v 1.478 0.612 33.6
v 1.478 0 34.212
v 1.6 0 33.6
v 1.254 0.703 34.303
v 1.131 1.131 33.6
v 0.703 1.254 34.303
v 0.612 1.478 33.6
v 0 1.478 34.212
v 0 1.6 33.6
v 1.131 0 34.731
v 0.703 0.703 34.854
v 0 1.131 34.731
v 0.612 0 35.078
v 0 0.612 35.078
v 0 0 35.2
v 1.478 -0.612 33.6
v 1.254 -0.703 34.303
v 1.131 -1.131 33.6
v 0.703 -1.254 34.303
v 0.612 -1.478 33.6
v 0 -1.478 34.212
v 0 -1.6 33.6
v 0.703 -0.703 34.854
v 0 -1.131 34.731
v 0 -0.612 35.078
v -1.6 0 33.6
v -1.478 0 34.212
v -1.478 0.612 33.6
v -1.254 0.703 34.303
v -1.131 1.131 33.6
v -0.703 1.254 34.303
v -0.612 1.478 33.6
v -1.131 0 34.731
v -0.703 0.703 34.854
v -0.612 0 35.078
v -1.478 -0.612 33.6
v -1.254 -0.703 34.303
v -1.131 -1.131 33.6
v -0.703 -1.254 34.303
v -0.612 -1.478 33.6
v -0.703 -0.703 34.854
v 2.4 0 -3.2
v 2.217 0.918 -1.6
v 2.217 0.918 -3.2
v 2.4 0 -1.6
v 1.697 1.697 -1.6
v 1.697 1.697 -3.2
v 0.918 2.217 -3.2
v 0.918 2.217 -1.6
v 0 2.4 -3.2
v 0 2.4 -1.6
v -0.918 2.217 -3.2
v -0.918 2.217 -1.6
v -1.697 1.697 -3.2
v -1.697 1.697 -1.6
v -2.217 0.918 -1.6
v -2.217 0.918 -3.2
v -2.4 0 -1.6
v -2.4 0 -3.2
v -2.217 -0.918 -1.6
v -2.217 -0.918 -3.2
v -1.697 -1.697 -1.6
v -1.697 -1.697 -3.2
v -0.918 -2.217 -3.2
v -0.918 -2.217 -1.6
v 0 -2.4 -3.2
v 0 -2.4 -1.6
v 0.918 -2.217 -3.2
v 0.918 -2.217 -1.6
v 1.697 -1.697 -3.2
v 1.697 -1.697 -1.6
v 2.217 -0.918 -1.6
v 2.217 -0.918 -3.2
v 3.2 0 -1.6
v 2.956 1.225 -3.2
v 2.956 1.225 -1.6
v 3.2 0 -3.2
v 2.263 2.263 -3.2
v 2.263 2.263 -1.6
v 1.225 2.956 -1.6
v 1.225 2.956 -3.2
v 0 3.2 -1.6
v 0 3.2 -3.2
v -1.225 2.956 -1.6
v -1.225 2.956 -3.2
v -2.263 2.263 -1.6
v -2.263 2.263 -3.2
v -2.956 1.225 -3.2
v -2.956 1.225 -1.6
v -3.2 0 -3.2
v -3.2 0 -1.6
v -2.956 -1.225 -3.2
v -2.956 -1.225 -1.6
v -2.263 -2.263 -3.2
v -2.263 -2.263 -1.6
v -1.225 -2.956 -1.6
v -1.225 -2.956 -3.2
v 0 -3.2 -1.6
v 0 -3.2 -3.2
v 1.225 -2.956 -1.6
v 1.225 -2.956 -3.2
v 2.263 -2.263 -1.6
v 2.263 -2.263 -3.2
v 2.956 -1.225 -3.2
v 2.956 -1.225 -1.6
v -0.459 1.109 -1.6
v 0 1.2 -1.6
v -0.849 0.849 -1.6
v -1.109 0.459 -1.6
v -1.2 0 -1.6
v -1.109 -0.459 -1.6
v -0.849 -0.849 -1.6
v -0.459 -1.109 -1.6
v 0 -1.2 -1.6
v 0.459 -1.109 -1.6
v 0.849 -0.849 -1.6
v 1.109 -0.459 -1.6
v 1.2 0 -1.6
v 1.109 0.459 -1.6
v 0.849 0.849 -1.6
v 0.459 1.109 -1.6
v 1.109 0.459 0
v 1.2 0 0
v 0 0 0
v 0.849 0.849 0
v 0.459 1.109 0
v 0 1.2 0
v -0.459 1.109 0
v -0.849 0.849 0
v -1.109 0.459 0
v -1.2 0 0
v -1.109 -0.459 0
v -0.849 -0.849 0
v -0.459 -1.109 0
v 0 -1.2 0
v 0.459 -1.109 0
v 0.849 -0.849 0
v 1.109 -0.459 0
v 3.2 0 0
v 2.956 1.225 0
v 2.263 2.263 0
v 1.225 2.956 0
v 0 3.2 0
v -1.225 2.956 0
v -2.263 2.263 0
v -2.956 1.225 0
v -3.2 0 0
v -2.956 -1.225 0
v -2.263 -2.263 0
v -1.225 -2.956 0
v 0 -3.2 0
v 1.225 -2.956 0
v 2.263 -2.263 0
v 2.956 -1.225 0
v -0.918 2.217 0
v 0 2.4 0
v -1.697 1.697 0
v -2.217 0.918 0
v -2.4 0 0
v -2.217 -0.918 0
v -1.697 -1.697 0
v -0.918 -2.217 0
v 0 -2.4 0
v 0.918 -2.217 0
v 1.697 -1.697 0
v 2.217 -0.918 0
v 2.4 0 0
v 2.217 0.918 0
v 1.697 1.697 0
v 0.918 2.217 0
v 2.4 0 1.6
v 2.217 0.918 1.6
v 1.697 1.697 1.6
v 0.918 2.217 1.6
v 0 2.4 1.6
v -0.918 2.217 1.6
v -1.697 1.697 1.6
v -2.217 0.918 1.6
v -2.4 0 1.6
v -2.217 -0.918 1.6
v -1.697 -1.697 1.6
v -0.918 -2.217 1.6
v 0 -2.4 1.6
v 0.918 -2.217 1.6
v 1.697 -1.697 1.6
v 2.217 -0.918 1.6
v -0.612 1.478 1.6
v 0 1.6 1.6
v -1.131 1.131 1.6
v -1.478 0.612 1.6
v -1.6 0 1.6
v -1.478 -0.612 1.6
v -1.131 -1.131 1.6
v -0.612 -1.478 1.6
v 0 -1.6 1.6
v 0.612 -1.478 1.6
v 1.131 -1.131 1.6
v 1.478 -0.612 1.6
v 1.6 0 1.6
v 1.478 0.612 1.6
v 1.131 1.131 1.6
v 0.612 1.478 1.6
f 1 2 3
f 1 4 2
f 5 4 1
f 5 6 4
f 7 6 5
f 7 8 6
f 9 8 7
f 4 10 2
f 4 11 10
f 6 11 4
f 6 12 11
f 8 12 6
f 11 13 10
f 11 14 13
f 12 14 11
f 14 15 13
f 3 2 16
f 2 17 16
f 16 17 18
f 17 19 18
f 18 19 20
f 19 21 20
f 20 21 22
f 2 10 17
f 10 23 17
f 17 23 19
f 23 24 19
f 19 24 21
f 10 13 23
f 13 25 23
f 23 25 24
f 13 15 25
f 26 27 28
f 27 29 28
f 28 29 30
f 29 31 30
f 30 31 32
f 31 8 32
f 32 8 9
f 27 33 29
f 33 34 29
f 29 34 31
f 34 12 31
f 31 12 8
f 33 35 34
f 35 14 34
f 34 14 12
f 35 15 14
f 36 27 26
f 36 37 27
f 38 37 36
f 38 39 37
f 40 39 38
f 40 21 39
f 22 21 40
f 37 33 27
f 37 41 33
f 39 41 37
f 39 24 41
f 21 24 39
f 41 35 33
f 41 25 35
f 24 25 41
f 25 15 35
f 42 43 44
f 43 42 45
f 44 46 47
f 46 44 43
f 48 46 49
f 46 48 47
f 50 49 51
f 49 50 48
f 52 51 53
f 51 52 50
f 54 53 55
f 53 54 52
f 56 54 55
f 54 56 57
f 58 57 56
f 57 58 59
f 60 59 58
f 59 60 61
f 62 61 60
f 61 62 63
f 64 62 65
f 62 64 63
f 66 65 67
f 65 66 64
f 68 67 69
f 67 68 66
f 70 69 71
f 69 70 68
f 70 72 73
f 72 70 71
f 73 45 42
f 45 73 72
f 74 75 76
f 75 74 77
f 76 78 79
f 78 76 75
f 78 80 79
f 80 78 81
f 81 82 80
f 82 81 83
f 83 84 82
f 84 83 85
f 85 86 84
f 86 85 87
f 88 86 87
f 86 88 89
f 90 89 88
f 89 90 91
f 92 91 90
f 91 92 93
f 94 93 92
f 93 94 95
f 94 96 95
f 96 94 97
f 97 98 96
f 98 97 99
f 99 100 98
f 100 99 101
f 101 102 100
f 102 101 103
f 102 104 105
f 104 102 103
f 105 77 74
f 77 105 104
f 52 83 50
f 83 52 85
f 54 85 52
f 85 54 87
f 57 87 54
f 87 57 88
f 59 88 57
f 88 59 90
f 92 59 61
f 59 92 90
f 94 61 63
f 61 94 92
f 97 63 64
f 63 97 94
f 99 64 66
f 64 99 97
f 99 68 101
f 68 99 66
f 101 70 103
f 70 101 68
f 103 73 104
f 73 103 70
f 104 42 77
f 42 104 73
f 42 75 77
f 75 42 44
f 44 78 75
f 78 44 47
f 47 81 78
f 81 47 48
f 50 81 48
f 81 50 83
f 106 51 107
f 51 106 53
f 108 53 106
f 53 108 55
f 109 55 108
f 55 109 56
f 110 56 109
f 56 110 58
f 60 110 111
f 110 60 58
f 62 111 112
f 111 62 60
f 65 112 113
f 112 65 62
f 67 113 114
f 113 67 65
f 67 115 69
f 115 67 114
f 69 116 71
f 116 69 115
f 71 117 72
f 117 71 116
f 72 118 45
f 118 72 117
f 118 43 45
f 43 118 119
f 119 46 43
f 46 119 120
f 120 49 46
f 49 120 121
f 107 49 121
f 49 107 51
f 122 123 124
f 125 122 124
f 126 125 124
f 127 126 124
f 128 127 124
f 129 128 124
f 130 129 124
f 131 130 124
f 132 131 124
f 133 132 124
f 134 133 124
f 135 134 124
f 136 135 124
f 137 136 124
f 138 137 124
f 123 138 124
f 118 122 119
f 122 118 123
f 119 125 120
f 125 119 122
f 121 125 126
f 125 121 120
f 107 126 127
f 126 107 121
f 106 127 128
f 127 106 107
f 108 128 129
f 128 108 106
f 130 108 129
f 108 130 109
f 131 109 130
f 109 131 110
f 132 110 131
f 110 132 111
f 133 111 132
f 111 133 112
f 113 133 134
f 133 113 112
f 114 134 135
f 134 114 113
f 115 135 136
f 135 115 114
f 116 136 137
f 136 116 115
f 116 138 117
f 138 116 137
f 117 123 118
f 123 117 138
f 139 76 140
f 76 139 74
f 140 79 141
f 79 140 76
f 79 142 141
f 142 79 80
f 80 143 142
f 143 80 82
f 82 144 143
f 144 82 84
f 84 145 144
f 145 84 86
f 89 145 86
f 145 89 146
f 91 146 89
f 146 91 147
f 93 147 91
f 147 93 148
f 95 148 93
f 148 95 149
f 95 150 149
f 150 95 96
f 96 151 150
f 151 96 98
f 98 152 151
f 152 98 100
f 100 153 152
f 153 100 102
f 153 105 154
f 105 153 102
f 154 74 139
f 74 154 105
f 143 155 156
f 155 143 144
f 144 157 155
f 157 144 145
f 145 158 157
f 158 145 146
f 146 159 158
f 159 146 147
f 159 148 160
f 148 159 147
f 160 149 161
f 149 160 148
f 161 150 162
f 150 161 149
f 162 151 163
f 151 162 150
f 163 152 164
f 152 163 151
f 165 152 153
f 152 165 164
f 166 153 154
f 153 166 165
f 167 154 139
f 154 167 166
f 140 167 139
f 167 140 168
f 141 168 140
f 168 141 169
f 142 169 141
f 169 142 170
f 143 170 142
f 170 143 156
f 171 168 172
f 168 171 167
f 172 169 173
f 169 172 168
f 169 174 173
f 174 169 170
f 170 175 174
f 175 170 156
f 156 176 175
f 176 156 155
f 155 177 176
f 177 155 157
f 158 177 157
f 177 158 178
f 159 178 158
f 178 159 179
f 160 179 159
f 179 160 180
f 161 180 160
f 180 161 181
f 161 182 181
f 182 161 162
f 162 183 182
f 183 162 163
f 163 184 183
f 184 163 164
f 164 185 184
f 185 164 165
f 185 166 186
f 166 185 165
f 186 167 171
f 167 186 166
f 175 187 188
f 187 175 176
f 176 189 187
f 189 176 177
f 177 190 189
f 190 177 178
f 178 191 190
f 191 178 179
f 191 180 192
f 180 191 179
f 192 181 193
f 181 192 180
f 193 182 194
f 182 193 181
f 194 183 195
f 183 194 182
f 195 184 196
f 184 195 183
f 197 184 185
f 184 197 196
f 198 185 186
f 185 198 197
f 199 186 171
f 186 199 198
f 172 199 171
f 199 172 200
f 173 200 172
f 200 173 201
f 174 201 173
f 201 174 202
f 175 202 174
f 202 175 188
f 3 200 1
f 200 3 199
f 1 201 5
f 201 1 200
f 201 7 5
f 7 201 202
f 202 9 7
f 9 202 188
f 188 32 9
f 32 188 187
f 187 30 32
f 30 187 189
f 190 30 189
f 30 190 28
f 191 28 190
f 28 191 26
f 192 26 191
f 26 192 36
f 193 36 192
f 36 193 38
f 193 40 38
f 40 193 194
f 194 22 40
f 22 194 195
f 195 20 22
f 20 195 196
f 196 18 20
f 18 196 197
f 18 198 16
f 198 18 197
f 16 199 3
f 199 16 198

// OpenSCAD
use <../lib.scad>
use <3957.scad>
$fa=1; $fs=0.2;
function ldraw_lib__148(realsolid=false) = [
// 0 ~Moved to 3957
// 0 Name: 148.dat
// 0 Author: [PTadmin]
// 0 !LDRAW_ORG Part UPDATE 1998-06
// 0 !LICENSE Licensed under CC BY 4.0 : see CAreadme.txt
// 
// 0 BFC CERTIFY CCW
  [0,"BFC","CERTIFY"],
  [0,"BFC","CCW"],
// 
// 0 !HISTORY 1998-06-20 [PTadmin] Official Update 1998-06
// 0 !HISTORY 2007-05-08 [PTadmin] Header formatted for Contributor Agreement
// 0 !HISTORY 2008-07-01 [PTadmin] Official Update 2008-01
// 
// 
// 1 16 0 0 0 1 0 0 0 1 0 0 0 1 3957.dat
  [1,16,0,0,0,1,0,0,0,1,0,0,0,1, ldraw_lib__3957(realsolid)],
];
module ldraw_lib__148(step=0, col=false, unit=2/5, alt=false, line=0.2, solid=!$preview)
    makepoly(ldraw_lib__148(solid), step=step, col=col, unit=unit, alt=alt, line=line, solid=solid);
ldraw_lib__148(line=0.2);
